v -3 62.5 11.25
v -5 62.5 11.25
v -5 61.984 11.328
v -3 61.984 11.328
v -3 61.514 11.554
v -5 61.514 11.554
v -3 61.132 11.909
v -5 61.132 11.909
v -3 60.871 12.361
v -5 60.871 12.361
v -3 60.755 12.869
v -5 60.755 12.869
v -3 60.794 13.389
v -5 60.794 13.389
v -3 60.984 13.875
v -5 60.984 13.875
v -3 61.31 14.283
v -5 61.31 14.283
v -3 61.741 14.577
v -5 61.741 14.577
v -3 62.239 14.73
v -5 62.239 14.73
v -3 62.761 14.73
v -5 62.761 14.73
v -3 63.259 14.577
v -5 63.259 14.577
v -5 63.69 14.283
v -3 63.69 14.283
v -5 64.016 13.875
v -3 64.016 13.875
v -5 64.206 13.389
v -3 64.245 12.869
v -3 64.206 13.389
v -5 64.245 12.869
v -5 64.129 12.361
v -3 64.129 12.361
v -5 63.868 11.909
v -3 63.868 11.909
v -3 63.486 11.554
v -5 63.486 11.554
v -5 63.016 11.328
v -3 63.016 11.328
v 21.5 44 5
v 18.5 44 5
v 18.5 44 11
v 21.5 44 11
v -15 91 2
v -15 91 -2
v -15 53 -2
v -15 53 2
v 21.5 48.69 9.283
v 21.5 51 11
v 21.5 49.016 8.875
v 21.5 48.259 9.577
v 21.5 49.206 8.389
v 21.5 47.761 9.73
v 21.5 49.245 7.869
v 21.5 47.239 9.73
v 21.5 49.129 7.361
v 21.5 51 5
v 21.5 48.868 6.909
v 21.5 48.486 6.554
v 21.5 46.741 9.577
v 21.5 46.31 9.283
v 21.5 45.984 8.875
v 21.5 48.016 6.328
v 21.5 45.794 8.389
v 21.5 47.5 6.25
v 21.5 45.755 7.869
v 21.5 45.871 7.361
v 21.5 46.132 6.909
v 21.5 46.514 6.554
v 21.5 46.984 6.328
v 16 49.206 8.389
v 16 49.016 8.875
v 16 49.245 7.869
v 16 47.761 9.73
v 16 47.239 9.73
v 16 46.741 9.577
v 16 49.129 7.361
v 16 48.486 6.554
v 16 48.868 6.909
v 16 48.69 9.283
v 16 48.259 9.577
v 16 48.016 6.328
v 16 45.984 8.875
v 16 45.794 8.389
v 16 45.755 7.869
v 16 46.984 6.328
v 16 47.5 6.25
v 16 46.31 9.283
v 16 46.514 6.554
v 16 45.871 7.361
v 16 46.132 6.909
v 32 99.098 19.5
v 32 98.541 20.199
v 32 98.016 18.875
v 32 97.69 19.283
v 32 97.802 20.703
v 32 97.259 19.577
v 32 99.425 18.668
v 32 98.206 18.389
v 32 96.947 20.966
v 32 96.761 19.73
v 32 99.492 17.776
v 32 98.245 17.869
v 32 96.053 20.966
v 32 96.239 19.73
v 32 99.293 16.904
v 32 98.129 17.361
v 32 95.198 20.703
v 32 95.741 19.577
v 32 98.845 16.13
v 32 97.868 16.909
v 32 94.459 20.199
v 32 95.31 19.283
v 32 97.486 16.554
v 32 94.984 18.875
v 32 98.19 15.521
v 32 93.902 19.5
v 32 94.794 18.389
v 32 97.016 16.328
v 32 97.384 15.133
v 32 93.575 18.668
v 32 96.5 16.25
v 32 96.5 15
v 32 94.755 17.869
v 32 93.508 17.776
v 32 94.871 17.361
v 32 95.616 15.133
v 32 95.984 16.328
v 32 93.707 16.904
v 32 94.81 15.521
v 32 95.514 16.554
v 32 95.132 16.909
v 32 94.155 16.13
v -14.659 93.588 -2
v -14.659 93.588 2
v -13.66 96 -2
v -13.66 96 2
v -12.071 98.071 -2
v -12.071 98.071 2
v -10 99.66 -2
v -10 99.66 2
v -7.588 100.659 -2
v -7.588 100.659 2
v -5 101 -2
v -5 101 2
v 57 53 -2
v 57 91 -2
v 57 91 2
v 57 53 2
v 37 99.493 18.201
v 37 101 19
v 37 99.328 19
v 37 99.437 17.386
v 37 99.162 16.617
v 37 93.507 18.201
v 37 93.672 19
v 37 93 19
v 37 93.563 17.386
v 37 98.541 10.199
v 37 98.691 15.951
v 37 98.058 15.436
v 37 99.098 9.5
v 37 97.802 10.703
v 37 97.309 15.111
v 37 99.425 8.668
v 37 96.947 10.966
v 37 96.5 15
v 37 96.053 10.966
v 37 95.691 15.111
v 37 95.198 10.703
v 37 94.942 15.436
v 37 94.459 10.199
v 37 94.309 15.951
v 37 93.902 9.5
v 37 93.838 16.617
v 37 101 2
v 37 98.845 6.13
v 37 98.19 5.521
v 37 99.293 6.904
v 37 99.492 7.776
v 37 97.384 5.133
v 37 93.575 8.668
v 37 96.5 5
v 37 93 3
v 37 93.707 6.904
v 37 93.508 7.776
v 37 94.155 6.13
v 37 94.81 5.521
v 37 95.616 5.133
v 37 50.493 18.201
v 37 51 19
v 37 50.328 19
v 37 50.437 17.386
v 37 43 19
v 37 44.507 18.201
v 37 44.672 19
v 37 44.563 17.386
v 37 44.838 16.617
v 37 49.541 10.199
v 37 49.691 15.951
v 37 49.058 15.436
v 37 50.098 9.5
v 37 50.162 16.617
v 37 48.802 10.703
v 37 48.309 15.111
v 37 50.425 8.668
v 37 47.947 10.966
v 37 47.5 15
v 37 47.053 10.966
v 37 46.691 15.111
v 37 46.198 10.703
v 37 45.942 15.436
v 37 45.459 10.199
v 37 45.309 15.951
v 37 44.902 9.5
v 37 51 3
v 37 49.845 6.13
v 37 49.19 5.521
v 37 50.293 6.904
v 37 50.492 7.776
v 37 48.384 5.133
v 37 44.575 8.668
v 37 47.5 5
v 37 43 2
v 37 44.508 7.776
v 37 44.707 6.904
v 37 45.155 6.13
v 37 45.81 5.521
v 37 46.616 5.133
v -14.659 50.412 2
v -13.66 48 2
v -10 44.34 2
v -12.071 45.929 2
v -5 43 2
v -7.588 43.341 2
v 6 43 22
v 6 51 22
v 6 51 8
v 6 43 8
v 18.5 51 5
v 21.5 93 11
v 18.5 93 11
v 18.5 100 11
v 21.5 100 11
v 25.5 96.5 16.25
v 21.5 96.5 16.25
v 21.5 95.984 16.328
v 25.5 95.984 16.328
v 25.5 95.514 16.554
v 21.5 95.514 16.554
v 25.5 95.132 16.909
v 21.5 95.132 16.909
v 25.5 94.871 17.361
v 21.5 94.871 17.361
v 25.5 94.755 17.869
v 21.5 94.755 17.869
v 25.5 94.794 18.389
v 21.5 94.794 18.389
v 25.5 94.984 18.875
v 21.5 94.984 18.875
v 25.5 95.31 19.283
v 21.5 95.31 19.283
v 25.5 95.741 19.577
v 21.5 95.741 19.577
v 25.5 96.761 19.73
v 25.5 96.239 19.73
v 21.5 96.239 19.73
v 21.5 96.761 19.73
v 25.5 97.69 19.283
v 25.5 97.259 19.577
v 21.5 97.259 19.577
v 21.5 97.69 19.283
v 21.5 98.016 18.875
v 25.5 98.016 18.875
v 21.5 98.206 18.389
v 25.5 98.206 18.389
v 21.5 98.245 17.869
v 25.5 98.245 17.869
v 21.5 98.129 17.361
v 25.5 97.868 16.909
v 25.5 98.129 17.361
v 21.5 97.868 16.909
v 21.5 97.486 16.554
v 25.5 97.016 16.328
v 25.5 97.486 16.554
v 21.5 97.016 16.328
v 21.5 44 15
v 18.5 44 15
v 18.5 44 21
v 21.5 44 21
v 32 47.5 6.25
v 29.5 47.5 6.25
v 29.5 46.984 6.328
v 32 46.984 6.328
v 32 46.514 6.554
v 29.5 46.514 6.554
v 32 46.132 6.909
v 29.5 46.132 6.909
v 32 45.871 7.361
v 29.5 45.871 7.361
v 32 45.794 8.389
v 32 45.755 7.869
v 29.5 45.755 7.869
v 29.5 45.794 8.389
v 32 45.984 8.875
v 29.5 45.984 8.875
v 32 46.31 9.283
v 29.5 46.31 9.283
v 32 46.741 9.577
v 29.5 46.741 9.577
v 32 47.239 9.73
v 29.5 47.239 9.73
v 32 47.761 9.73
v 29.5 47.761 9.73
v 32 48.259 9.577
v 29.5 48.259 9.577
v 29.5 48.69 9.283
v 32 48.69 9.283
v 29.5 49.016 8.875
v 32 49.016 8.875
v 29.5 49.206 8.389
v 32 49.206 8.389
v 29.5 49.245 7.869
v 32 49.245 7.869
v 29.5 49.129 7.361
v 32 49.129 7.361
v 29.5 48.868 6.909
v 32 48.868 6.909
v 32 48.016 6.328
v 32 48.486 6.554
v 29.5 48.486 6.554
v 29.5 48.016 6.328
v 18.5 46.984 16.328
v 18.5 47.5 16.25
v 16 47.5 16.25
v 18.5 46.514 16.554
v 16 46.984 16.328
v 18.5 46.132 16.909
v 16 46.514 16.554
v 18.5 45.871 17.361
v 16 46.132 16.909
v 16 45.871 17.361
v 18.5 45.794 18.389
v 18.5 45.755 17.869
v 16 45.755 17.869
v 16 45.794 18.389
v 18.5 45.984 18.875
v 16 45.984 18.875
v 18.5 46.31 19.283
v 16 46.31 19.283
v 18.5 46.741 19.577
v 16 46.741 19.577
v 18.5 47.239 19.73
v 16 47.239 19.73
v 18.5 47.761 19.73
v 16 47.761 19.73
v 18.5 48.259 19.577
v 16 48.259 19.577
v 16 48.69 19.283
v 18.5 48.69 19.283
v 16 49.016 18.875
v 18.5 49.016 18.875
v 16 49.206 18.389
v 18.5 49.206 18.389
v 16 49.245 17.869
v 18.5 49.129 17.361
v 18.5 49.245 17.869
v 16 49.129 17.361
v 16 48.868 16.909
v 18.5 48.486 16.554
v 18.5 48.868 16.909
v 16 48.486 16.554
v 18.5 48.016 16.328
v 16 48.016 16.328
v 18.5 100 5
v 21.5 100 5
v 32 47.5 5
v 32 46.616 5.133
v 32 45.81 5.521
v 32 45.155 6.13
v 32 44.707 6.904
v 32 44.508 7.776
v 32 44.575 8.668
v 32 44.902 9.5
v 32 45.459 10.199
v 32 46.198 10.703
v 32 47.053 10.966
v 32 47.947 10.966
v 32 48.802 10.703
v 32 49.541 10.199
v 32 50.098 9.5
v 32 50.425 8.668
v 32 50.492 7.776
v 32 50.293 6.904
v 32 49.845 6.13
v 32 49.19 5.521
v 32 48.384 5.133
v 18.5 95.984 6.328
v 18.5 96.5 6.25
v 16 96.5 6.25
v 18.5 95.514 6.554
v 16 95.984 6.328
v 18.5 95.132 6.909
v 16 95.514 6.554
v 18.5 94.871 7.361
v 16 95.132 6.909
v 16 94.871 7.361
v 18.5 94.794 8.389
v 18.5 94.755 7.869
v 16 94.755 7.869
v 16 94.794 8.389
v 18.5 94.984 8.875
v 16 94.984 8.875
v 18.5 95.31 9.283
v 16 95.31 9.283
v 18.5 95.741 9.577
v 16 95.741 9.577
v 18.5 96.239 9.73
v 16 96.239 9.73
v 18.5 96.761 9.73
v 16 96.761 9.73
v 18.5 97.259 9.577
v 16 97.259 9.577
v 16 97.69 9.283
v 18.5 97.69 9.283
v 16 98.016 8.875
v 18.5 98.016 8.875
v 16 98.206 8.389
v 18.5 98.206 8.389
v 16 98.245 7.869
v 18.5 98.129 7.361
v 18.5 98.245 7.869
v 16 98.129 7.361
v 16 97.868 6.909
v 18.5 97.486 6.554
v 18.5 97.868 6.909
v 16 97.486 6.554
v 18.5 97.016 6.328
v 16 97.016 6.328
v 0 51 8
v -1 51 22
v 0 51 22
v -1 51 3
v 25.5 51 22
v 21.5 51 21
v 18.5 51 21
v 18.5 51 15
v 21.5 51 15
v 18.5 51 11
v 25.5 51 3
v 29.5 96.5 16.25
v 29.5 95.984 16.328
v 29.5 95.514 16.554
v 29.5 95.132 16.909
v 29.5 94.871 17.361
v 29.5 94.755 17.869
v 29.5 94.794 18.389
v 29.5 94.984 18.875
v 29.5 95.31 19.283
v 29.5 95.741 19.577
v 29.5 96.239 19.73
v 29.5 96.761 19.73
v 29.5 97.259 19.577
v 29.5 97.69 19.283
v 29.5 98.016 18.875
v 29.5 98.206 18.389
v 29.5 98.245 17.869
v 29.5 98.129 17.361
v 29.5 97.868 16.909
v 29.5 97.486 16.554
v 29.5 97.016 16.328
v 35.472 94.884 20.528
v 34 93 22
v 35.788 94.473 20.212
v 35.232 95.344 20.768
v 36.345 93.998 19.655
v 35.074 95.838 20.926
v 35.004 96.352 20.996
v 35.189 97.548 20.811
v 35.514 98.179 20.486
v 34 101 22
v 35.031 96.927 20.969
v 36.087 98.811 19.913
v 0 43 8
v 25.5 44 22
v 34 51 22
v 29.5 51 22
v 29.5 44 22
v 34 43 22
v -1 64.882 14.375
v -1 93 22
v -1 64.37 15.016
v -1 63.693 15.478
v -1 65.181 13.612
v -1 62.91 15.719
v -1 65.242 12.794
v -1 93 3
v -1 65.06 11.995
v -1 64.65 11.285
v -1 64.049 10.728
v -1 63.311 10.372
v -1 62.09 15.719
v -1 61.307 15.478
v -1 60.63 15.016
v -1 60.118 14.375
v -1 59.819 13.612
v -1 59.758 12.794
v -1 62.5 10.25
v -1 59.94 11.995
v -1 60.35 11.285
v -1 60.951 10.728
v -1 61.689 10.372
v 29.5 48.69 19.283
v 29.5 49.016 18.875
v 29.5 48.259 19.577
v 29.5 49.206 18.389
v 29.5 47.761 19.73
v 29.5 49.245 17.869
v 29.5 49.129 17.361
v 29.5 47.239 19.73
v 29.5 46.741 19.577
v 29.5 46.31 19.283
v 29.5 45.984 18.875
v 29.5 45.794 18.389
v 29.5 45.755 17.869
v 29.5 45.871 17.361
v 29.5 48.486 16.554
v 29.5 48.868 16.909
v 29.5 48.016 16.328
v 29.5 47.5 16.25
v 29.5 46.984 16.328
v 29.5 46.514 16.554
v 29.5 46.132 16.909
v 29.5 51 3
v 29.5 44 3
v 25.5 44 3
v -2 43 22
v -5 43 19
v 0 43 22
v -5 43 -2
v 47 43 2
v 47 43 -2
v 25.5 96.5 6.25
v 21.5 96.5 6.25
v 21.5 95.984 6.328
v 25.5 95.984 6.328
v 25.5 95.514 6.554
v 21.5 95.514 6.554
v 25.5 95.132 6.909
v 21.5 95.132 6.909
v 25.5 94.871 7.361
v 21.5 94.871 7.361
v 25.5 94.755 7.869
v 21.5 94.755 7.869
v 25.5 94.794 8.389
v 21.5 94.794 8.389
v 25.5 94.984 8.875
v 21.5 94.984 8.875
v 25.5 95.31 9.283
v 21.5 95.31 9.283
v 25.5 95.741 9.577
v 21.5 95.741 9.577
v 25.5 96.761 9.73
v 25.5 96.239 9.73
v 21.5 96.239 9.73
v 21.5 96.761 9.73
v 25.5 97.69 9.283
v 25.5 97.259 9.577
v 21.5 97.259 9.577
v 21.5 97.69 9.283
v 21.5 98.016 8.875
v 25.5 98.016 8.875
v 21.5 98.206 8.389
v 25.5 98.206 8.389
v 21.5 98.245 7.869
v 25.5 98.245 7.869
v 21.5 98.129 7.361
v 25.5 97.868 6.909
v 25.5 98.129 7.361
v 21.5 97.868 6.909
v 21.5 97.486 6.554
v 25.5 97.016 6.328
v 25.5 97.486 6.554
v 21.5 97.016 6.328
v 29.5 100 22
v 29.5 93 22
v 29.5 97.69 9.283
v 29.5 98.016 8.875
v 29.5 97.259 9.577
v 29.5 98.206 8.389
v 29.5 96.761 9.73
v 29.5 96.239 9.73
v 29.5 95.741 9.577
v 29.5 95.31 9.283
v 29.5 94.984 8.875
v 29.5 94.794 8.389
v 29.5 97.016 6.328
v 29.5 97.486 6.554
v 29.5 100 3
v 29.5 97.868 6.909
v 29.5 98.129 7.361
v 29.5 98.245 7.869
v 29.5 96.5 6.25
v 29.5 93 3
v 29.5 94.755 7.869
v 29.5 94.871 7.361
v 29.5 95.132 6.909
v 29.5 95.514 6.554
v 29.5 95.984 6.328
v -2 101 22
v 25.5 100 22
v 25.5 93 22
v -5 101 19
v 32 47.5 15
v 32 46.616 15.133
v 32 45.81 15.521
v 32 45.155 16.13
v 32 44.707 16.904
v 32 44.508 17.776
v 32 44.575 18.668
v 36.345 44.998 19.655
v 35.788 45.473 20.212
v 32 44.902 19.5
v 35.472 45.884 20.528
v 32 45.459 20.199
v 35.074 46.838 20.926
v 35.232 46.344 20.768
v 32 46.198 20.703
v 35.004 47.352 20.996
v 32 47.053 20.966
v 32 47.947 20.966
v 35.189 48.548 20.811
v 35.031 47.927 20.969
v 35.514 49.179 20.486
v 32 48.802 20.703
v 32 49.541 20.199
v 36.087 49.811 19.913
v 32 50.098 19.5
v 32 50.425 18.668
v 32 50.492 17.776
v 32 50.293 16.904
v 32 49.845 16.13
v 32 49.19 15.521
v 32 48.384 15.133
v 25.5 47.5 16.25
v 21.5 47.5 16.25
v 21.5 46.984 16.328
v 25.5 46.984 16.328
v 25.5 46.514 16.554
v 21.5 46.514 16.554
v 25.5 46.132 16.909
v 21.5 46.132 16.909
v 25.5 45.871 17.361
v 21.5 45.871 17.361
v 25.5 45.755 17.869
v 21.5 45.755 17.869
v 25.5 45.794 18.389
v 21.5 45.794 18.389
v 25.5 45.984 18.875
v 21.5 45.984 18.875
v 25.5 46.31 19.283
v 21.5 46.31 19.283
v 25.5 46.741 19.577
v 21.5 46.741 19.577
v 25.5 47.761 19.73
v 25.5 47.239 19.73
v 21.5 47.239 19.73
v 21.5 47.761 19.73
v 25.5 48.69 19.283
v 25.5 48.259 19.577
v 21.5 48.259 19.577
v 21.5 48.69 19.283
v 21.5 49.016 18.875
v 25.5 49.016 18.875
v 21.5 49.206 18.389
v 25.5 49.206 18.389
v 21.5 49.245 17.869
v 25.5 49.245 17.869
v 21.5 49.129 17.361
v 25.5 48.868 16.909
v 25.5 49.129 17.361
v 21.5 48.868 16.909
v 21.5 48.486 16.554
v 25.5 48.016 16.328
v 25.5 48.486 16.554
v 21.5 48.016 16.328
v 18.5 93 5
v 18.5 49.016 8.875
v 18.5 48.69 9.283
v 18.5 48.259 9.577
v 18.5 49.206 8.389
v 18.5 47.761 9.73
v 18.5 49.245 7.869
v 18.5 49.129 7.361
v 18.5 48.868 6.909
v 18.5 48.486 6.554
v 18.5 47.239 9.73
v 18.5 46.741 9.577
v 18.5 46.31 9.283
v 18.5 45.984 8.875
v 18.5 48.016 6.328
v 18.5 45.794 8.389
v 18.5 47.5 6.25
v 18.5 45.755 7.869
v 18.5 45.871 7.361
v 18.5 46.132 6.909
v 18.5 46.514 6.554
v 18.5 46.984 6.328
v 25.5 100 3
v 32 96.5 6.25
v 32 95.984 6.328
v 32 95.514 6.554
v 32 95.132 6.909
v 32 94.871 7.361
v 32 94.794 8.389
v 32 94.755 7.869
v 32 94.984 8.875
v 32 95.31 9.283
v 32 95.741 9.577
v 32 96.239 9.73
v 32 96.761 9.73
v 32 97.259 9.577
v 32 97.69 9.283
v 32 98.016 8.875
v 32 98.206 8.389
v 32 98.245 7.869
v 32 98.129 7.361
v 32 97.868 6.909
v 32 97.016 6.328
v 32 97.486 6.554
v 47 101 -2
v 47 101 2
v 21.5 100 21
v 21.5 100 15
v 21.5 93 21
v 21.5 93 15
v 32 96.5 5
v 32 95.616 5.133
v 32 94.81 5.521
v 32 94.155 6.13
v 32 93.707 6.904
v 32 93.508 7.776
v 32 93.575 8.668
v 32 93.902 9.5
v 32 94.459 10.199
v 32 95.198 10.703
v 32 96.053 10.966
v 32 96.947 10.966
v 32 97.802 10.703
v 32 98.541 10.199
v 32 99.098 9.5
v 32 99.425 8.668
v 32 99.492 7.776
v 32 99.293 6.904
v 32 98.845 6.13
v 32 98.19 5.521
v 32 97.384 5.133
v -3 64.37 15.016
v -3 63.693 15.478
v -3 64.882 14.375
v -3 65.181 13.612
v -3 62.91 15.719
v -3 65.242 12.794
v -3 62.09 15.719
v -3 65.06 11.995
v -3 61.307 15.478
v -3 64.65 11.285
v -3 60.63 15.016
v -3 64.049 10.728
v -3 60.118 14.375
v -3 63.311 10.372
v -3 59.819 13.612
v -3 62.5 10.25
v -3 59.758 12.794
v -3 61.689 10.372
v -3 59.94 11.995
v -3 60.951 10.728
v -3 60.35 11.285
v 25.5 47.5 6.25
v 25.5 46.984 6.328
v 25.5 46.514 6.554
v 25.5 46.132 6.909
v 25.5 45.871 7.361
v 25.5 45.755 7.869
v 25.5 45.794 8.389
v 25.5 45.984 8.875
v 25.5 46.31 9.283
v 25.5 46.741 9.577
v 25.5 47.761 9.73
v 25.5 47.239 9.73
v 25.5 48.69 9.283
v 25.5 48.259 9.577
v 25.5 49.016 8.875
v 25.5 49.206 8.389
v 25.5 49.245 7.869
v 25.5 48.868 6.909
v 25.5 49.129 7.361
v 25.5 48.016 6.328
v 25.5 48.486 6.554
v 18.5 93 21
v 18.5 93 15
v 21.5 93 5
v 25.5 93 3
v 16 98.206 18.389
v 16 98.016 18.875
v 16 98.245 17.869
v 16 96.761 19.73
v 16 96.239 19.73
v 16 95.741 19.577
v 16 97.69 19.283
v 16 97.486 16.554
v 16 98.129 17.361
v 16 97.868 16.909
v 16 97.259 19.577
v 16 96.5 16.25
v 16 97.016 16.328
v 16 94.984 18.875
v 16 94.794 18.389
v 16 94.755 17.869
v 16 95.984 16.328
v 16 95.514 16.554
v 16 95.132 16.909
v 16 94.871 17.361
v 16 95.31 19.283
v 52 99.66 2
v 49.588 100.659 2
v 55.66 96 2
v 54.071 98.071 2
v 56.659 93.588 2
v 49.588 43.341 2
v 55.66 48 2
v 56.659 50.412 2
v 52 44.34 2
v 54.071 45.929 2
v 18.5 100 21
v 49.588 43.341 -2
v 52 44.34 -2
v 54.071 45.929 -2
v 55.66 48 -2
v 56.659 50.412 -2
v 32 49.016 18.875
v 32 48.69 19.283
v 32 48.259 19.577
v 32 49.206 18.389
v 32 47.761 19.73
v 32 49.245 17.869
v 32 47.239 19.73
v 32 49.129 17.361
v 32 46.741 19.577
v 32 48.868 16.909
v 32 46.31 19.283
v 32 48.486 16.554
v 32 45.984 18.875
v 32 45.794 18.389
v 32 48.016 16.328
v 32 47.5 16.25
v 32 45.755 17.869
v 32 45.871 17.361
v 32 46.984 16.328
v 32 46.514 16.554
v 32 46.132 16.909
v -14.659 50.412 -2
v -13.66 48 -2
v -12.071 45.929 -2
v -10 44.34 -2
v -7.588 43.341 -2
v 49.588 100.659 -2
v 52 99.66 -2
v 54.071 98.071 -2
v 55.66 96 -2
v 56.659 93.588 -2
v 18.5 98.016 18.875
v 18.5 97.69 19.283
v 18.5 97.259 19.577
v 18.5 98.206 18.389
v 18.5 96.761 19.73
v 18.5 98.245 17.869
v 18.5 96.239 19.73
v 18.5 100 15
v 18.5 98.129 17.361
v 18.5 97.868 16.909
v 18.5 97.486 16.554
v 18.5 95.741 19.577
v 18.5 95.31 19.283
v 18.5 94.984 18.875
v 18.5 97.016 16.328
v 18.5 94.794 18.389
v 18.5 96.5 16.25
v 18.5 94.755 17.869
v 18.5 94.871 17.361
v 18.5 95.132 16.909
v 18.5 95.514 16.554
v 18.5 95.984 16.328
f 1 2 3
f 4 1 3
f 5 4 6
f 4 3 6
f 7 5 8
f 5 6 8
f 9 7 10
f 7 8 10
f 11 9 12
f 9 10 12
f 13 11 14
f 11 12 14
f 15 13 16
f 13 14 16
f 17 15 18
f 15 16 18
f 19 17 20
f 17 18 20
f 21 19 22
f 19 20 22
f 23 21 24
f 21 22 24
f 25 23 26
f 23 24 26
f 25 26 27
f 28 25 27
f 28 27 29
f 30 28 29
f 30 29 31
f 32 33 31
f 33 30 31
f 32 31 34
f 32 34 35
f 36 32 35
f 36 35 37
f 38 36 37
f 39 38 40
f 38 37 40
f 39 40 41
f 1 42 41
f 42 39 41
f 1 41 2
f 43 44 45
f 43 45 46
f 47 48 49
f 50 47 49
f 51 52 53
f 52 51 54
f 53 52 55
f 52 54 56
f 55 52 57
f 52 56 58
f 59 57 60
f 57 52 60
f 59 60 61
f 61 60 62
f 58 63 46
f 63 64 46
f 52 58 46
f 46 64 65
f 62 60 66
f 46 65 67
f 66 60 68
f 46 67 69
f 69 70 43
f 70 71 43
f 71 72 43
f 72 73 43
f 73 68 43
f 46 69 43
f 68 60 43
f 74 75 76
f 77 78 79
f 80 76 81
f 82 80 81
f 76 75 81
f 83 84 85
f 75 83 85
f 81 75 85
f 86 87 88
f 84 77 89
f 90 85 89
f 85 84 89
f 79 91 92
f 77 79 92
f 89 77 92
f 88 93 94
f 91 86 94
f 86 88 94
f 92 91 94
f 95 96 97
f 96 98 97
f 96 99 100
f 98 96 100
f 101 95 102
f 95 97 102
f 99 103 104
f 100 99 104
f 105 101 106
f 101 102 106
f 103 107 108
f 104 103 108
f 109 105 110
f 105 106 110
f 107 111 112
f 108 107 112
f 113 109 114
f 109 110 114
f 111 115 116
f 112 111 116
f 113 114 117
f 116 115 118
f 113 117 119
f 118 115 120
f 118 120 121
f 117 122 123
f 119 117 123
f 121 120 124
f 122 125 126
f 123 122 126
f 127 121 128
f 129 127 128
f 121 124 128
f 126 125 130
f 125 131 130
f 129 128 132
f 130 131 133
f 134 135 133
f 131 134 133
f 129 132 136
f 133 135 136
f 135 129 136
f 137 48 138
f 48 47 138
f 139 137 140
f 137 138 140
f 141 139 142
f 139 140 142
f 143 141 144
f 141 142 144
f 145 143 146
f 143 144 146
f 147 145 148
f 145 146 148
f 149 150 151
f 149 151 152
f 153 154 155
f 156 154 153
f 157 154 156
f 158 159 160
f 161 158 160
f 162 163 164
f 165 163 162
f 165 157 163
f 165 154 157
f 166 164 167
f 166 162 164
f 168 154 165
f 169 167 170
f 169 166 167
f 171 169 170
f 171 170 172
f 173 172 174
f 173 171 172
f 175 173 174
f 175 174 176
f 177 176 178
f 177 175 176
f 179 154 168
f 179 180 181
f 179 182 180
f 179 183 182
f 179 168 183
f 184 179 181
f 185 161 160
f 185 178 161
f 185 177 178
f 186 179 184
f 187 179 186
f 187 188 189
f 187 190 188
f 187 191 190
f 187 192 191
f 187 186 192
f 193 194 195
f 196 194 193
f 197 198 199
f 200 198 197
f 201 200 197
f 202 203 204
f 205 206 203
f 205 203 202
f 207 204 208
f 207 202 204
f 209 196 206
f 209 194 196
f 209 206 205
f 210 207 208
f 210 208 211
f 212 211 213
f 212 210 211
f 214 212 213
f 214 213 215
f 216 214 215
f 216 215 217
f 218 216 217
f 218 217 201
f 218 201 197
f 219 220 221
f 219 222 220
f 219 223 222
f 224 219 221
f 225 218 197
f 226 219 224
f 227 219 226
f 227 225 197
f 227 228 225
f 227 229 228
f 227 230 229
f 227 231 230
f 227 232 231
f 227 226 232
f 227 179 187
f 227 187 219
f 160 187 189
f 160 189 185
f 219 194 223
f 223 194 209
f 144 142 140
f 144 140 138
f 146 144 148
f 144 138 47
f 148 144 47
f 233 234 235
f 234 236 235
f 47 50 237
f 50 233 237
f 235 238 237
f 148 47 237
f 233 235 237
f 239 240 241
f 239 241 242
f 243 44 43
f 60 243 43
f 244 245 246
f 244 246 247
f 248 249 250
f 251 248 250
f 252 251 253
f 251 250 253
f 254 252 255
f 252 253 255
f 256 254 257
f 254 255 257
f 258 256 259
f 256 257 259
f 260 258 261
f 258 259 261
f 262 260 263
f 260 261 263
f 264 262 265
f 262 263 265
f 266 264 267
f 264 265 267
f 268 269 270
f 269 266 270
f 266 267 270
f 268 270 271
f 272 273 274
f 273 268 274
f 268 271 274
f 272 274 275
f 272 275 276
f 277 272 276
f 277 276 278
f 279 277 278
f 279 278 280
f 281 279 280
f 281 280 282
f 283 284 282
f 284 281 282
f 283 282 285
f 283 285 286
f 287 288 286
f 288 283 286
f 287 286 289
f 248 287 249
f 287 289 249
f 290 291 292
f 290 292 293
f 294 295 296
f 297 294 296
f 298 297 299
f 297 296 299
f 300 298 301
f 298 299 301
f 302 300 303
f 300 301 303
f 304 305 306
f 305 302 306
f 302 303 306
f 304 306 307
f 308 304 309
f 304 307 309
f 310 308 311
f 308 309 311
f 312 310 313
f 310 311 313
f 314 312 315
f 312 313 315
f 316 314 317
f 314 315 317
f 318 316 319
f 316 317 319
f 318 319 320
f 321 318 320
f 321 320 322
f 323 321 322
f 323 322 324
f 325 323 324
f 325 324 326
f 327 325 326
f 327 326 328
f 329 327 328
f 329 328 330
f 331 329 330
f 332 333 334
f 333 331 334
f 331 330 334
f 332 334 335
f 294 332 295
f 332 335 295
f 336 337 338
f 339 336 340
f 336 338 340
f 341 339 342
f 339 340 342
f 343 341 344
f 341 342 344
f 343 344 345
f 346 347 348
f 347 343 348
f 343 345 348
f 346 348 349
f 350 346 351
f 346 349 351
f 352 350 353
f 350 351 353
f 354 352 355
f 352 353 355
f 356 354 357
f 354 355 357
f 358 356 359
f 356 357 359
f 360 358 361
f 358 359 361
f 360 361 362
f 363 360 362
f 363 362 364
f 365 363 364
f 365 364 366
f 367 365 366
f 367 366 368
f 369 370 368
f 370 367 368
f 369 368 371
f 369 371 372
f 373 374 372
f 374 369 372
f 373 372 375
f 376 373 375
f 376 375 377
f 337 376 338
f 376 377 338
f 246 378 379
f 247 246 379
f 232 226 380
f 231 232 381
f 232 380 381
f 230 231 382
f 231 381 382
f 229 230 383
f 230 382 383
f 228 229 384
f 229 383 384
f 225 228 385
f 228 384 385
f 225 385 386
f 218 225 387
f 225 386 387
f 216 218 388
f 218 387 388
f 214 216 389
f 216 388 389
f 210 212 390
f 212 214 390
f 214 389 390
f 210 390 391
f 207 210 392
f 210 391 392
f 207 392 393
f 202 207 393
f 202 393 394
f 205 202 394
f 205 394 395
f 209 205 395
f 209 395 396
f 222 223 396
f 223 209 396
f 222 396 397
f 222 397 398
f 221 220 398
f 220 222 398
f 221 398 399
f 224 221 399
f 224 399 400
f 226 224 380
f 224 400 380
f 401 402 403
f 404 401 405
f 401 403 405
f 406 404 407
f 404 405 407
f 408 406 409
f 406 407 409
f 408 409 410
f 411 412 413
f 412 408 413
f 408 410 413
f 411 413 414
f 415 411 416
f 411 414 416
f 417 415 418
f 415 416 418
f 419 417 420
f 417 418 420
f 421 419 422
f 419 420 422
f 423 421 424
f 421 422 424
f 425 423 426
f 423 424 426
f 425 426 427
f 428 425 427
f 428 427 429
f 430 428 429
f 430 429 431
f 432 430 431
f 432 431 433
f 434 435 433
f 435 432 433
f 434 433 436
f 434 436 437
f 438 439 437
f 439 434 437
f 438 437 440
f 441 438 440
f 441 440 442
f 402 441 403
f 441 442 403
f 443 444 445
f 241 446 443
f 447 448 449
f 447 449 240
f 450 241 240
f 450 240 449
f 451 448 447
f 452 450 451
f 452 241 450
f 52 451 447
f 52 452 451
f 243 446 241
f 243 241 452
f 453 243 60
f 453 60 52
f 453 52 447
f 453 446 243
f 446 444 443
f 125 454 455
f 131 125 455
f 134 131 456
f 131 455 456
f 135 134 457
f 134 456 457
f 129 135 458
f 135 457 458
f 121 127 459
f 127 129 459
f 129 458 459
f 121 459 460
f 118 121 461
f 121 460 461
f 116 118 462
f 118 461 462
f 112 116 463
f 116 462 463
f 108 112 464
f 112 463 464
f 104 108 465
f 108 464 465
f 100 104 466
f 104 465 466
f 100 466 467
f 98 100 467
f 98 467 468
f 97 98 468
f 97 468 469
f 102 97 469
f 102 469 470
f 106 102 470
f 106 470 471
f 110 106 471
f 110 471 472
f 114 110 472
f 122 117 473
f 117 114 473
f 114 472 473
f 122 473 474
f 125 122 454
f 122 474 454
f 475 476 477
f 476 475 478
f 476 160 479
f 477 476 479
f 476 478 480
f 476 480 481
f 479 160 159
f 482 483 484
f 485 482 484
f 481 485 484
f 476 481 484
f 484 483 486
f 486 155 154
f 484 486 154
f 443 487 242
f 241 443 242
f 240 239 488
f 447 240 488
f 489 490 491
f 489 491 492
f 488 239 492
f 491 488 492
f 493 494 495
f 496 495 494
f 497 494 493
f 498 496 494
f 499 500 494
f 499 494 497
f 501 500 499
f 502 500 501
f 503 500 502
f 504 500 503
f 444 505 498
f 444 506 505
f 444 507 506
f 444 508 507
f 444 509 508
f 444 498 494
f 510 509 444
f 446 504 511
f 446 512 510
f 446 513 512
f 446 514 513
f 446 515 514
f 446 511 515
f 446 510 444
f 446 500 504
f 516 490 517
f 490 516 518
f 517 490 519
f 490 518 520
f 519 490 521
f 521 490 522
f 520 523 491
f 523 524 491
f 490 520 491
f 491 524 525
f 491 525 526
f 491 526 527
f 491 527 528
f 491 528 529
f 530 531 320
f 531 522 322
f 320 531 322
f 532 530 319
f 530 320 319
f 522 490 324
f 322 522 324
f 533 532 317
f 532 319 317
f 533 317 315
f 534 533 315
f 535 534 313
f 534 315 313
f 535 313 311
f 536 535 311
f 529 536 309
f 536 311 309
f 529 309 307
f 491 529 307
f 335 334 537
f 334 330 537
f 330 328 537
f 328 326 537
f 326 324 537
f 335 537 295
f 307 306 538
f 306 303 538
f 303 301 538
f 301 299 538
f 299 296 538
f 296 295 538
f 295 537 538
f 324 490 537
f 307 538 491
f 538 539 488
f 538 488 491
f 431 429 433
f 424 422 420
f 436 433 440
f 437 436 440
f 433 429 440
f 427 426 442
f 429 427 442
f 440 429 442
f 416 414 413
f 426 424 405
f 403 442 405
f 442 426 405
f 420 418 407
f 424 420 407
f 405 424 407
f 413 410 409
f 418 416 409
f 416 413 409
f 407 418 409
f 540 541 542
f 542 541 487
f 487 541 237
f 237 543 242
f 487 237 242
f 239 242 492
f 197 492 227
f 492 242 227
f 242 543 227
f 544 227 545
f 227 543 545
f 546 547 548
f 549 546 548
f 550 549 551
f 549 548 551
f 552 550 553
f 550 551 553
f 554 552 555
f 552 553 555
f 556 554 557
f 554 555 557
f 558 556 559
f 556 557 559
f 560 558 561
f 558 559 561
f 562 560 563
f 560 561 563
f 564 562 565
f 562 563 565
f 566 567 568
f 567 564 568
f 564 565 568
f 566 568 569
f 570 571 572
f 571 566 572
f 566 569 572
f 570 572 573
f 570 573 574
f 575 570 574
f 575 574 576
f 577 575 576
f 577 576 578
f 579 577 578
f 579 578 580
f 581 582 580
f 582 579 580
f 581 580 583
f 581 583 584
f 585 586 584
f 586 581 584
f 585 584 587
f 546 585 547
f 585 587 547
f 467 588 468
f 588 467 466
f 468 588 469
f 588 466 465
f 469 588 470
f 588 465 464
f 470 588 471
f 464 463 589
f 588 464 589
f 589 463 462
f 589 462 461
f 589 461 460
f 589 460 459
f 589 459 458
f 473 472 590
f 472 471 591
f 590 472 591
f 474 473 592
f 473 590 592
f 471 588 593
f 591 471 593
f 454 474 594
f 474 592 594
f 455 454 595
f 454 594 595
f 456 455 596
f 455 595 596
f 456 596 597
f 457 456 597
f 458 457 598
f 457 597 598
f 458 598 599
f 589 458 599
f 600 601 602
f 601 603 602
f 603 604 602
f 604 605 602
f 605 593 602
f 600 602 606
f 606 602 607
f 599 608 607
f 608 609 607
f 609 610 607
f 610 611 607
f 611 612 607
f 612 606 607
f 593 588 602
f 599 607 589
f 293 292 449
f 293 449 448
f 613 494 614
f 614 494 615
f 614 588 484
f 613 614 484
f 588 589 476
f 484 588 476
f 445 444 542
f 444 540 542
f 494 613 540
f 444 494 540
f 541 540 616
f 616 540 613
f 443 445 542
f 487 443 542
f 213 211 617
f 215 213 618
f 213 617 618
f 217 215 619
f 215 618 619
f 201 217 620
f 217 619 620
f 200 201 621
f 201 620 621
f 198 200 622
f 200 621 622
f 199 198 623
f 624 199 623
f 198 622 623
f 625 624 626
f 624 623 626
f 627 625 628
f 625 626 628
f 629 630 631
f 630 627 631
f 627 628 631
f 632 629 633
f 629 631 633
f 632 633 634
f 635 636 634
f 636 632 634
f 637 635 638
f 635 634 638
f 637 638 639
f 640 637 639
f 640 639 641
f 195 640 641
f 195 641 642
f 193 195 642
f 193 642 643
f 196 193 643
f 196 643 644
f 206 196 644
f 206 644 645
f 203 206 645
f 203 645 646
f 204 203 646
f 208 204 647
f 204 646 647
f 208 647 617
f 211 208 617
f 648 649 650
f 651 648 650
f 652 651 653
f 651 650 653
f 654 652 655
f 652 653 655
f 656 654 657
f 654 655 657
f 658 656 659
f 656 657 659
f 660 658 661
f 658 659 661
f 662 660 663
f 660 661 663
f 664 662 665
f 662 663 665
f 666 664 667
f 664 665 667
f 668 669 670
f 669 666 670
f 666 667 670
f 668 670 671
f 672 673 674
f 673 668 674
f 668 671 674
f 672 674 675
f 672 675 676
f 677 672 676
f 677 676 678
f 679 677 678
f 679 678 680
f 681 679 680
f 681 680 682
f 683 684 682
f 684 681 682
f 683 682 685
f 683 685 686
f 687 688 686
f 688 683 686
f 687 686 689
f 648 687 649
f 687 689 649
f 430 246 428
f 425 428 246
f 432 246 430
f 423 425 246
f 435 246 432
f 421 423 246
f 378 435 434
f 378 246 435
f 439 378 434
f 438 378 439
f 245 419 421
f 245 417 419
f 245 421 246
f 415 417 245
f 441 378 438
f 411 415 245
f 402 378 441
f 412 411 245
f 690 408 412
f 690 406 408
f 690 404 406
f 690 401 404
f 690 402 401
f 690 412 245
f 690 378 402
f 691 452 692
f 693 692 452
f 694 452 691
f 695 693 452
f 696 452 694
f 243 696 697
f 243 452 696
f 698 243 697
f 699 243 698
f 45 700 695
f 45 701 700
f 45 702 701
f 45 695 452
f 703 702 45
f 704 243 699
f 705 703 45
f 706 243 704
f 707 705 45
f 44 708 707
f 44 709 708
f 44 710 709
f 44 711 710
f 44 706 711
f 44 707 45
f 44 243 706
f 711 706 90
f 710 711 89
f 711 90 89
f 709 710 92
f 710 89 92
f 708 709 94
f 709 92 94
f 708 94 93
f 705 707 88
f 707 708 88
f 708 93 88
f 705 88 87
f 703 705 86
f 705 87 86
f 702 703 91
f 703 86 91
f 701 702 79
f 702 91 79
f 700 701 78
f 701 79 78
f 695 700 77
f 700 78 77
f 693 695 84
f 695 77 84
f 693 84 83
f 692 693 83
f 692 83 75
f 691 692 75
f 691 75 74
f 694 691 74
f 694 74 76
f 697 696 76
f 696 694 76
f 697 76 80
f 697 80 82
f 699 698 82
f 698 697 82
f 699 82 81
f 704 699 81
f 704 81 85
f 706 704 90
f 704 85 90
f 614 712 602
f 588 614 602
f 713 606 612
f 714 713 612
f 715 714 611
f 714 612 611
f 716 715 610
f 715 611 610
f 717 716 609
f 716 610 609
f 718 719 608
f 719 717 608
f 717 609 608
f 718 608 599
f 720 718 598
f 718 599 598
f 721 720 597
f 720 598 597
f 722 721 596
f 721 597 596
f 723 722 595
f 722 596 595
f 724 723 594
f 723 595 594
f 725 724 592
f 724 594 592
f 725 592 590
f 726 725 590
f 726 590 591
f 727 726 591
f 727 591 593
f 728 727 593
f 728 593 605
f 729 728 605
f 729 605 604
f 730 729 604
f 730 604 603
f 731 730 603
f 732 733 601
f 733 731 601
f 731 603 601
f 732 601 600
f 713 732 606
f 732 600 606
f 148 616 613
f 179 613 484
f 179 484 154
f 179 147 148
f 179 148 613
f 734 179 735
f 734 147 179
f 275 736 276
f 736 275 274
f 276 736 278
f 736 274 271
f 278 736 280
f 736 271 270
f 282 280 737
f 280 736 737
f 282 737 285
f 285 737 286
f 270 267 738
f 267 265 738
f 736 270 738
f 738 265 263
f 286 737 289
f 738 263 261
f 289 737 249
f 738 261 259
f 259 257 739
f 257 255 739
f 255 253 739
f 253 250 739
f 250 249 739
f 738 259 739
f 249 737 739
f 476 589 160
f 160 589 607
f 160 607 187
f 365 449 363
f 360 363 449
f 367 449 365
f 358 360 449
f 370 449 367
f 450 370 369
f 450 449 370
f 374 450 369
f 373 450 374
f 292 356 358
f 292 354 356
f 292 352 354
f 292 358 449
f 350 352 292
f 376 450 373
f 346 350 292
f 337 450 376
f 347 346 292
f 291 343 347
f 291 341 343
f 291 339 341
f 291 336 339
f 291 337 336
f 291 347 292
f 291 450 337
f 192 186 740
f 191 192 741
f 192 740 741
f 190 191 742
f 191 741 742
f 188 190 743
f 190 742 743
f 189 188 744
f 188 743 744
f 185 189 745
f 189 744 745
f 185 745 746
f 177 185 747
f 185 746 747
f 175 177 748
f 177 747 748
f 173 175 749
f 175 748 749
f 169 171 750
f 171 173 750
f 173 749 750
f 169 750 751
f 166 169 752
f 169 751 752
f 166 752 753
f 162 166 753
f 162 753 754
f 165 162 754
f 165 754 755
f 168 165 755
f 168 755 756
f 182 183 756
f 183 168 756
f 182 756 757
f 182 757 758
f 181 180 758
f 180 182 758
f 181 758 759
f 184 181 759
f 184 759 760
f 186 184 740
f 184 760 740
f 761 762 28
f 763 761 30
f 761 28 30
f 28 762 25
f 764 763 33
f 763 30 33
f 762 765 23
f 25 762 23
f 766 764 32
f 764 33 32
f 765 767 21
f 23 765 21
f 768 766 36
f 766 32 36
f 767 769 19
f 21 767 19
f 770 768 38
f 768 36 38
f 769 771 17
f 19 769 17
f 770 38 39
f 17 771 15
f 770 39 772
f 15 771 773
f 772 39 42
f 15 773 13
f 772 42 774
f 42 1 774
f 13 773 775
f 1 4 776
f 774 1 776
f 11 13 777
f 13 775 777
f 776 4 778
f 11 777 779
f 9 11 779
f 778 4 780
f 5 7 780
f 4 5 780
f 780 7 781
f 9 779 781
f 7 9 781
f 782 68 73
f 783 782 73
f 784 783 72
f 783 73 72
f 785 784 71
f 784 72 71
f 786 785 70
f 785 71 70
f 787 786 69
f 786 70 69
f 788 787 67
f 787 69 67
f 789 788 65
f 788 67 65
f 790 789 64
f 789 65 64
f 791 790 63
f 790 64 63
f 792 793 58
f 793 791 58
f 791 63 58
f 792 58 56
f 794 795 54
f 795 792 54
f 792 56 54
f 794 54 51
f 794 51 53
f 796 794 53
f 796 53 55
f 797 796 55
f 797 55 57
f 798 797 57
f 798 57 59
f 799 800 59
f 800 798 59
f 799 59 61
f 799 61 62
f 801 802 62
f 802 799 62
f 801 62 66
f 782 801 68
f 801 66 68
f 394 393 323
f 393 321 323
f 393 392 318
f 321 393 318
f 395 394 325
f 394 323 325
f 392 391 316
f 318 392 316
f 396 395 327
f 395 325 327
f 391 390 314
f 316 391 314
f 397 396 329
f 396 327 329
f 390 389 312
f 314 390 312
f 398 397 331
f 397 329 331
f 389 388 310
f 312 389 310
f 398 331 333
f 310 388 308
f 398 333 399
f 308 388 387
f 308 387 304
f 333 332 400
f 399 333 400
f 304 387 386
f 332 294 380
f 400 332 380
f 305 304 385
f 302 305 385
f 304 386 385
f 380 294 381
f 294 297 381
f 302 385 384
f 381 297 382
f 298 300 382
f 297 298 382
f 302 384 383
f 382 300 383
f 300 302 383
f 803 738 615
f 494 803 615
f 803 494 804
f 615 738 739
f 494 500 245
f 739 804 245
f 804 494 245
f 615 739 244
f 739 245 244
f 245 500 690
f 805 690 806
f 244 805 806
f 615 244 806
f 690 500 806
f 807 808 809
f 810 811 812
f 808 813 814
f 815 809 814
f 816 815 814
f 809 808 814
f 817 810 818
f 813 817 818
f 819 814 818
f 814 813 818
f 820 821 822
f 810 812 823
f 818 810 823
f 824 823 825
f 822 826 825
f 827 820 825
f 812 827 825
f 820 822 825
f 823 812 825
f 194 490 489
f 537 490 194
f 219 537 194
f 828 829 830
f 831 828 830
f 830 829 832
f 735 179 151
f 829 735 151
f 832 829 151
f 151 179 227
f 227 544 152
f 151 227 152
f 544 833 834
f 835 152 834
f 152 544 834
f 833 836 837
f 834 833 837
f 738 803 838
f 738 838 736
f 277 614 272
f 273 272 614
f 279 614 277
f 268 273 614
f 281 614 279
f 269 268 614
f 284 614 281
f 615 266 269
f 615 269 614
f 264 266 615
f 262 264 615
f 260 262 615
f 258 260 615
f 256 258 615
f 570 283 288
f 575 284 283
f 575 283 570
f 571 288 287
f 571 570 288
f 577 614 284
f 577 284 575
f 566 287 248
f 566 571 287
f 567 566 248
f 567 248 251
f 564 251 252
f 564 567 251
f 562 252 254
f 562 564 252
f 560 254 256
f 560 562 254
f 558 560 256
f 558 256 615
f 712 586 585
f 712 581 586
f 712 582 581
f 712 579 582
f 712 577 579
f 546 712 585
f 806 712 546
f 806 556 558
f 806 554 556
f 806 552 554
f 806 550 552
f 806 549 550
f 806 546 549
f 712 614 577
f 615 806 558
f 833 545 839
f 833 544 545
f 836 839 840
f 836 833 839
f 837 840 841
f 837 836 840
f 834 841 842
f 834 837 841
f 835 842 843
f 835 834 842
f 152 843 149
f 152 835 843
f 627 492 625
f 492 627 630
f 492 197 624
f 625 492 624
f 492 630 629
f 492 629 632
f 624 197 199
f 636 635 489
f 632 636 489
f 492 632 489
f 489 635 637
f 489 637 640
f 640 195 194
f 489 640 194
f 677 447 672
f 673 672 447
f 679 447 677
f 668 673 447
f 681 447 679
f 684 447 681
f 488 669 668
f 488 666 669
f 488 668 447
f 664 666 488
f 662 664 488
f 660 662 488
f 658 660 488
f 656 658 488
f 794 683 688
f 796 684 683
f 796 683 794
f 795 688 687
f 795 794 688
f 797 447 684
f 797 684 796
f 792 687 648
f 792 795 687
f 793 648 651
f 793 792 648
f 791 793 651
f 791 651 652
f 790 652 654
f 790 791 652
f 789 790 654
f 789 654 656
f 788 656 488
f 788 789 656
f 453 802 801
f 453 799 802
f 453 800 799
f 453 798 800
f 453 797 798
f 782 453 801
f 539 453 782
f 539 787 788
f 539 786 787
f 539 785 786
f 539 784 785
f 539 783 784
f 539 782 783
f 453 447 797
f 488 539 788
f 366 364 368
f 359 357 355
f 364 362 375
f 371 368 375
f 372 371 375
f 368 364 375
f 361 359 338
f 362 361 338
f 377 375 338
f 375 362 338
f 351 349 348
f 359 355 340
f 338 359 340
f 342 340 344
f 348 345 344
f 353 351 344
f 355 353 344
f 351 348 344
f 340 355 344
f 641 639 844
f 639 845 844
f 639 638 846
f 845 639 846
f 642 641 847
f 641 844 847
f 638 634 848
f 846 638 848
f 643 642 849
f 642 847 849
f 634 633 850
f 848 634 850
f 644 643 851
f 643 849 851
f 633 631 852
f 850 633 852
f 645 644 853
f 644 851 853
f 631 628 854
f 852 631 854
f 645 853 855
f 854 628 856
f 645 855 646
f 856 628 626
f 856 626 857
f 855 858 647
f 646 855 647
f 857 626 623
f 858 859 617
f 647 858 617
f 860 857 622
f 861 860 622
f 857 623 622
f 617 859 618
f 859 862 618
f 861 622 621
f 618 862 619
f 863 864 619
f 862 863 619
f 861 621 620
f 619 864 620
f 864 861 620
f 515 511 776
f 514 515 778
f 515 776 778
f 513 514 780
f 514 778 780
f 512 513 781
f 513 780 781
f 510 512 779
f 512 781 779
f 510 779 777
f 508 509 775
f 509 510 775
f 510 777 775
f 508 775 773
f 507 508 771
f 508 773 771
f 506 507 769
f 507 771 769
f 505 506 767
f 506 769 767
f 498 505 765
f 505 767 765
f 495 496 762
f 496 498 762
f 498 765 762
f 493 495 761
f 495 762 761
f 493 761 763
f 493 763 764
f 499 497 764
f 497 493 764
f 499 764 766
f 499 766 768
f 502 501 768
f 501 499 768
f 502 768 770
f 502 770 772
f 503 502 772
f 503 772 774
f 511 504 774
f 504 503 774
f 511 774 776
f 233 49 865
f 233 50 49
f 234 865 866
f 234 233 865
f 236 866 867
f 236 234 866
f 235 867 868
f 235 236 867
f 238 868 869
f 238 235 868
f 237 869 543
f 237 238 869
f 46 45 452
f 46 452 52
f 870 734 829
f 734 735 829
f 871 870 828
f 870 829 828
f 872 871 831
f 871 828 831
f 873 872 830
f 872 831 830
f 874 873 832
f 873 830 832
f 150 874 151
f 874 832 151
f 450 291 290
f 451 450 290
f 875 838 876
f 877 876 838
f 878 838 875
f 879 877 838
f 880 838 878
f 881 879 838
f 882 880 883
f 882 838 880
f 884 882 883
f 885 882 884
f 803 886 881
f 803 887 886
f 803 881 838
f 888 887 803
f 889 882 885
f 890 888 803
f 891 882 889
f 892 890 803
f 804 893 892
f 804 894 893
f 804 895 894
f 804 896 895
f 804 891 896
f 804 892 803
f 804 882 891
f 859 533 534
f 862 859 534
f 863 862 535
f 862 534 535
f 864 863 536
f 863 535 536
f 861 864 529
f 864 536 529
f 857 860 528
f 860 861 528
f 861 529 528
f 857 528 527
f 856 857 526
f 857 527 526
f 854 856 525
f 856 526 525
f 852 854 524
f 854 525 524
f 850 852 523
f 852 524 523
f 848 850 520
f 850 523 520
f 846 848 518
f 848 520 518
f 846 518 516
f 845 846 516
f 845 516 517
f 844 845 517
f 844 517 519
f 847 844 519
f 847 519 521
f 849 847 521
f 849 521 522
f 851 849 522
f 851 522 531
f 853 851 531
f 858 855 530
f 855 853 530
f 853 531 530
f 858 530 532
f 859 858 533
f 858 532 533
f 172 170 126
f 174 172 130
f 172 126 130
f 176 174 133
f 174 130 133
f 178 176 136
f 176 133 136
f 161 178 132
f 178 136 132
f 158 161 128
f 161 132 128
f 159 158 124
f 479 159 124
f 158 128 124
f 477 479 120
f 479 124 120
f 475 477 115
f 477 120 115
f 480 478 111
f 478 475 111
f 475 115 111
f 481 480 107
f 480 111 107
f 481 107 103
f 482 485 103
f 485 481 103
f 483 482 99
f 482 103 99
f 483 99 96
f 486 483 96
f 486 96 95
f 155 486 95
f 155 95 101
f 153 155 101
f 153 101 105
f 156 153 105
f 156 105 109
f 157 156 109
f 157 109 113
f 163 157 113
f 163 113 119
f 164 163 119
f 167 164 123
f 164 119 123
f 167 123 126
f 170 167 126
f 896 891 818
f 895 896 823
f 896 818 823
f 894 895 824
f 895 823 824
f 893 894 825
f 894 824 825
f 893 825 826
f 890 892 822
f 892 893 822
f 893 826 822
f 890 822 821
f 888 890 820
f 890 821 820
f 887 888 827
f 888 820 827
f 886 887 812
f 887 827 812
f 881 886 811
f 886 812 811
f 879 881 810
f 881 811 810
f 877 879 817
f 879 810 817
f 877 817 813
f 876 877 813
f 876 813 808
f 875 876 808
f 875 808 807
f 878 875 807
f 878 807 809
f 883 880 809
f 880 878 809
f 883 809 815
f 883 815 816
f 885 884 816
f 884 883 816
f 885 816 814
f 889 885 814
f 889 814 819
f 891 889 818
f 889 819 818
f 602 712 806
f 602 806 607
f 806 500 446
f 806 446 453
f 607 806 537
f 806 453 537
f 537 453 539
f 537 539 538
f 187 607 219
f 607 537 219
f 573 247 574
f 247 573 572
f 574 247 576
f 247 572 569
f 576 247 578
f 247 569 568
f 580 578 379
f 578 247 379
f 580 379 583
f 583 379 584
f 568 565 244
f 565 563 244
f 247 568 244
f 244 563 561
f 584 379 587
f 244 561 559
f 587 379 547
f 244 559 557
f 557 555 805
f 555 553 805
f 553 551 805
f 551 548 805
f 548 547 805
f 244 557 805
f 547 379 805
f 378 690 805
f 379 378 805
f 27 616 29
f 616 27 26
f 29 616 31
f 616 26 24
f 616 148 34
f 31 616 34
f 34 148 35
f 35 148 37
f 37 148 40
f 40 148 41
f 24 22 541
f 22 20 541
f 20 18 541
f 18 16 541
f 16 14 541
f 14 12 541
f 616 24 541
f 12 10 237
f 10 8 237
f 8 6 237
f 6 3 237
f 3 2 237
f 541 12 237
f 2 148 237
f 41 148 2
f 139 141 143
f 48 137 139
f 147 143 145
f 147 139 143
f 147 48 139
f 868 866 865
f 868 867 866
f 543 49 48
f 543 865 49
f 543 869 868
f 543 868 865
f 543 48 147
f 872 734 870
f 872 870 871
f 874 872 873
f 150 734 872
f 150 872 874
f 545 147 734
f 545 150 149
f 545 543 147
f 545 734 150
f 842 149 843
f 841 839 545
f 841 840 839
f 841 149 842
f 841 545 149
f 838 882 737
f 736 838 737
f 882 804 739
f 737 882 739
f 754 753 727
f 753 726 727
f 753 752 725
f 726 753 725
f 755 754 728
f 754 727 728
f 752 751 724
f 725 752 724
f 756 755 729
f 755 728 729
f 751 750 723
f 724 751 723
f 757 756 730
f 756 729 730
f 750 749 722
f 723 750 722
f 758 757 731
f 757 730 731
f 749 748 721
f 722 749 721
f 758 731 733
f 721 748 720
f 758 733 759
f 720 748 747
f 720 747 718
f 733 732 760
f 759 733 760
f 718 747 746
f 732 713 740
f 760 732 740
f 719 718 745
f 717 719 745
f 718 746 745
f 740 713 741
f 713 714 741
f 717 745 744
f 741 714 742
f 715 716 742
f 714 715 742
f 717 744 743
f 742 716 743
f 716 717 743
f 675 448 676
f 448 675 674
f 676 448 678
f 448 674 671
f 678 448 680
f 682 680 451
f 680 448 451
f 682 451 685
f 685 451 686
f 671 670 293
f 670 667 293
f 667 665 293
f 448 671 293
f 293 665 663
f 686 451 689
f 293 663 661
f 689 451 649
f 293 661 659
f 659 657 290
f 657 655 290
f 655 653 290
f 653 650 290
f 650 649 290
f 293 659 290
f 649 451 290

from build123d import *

# Parameters (mm, degrees)
BOX024_W                = 6
BOX024_H                = 36
BOX024_DEPTH            = 23
CYLINDER011_R           = 2.75
CYLINDER011_DEPTH       = 74.5
CYLINDER011_PITCH_ANGLE = 90
CYLINDER008_R           = 1.75
CYLINDER008_DEPTH       = 21.5
CYLINDER008_PITCH_ANGLE = 90
CYLINDER009_R           = 3
CYLINDER009_DEPTH       = 21.5
CYLINDER009_PITCH_ANGLE = 90
BOX007_W                = 3
BOX007_H                = 56
BOX007_DEPTH            = 6
BOX008_W                = 3
BOX008_H                = 56
BOX008_DEPTH            = 6
BOX006_W                = 4
BOX006_H                = 56
BOX006_DEPTH            = 21
CYLINDER003_R           = 1.75
CYLINDER003_DEPTH       = 74.5
CYLINDER003_PITCH_ANGLE = 90
BOX003_W                = 28
BOX003_H                = 88
BOX003_DEPTH            = 38
BOX002_W                = 28
BOX002_H                = 88
BOX002_DEPTH            = 38
BOX001_W                = 47
BOX001_H                = 42
BOX001_DEPTH            = 25
BOX_W                   = 72
BOX_H                   = 58
BOX_DEPTH               = 24
FILLET_R                = 10
CHAMFER_SIZE            = 3


with BuildPart() as cube024:
    # Box024 → Box024 (new body)
    with BuildSketch(Plane(origin=(0, 19, 7), x_dir=(1, 0, 0), z_dir=(0, 0, 1))):
        with Locations((3, 18)):
            Rectangle(BOX024_W, BOX024_H)
    extrude(amount=BOX024_DEPTH)


with BuildPart() as joint_d013:
    # Cylinder011 → Cylinder011 (new body)
    with BuildSketch(Plane.XY):
        Circle(CYLINDER011_R)
    extrude(amount=CYLINDER011_DEPTH)


with BuildPart() as joint_d013_1:
    # Cylinder011 pitch: moved
    add(joint_d013.part.rotate(Axis((0, 0, 0), (0, 1, 0)), CYLINDER011_PITCH_ANGLE))


with BuildPart() as joint_d013_2:
    # Cylinder011 placement: moved
    add(joint_d013_1.part.moved(Location((-3, 9.5, 12))))


with BuildPart() as joint_d010:
    # Cylinder008 → Cylinder008 (new body)
    with BuildSketch(Plane.XY):
        Circle(CYLINDER008_R)
    extrude(amount=CYLINDER008_DEPTH)


with BuildPart() as joint_d010_1:
    # Cylinder008 pitch: moved
    add(joint_d010.part.rotate(Axis((0, 0, 0), (0, 1, 0)), CYLINDER008_PITCH_ANGLE))


with BuildPart() as joint_d010_2:
    # Cylinder008 placement: moved
    add(joint_d010_1.part.moved(Location((16, -24.5, 7))))


with BuildPart() as joint_d011:
    # Cylinder009 → Cylinder009 (new body)
    with BuildSketch(Plane.XY):
        Circle(CYLINDER009_R)
    extrude(amount=CYLINDER009_DEPTH)


with BuildPart() as joint_d011_1:
    # Cylinder009 pitch: moved
    add(joint_d011.part.rotate(Axis((0, 0, 0), (0, 1, 0)), CYLINDER009_PITCH_ANGLE))


with BuildPart() as joint_d011_2:
    # Cylinder009 placement: moved
    add(joint_d011_1.part.moved(Location((32, -24.5, 7))))


with BuildPart() as fusion001:
    # Fusion001 base: copy of Joint-D011
    add(joint_d011_2.part)

    # Fusion001: union Joint-D010
    add(joint_d010_2.part)


with BuildPart() as fusion002:
    # Fusion002 base: copy of Joint-D011
    add(joint_d011_2.part)

    # Fusion002: union Joint-D010
    add(joint_d010_2.part)


with BuildPart() as fusion002_1:
    # Fusion002 placement: moved
    add(fusion002.part.moved(Location((0, 0, 10))))


with BuildPart() as fusion003:
    # Fusion003 base: copy of Joint-D011
    add(joint_d011_2.part)

    # Fusion003: union Joint-D010
    add(joint_d010_2.part)


with BuildPart() as fusion003_1:
    # Fusion003 placement: moved
    add(fusion003.part.moved(Location((0, 49, 0))))


with BuildPart() as fusion004:
    # Fusion004 base: copy of Joint-D011
    add(joint_d011_2.part)

    # Fusion004: union Joint-D010
    add(joint_d010_2.part)


with BuildPart() as fusion004_1:
    # Fusion004 placement: moved
    add(fusion004.part.moved(Location((0, 49, 10))))


with BuildPart() as cube007:
    # Box007 → Box007 (new body)
    with BuildSketch(Plane(origin=(18.5, -28, 4), x_dir=(1, 0, 0), z_dir=(0, 0, 1))):
        with Locations((1.5, 28)):
            Rectangle(BOX007_W, BOX007_H)
    extrude(amount=BOX007_DEPTH)


with BuildPart() as cube008:
    # Box008 → Box008 (new body)
    with BuildSketch(Plane(origin=(18.5, -28, 14), x_dir=(1, 0, 0), z_dir=(0, 0, 1))):
        with Locations((1.5, 28)):
            Rectangle(BOX008_W, BOX008_H)
    extrude(amount=BOX008_DEPTH)


with BuildPart() as cube006:
    # Box006 → Box006 (new body)
    with BuildSketch(Plane(origin=(25.5, -28, 2), x_dir=(1, 0, 0), z_dir=(0, 0, 1))):
        with Locations((2, 28)):
            Rectangle(BOX006_W, BOX006_H)
    extrude(amount=BOX006_DEPTH)


with BuildPart() as joint_d005:
    # Cylinder003 → Cylinder003 (new body)
    with BuildSketch(Plane.XY):
        Circle(CYLINDER003_R)
    extrude(amount=CYLINDER003_DEPTH)


with BuildPart() as joint_d005_1:
    # Cylinder003 pitch: moved
    add(joint_d005.part.rotate(Axis((0, 0, 0), (0, 1, 0)), CYLINDER003_PITCH_ANGLE))


with BuildPart() as joint_d005_2:
    # Cylinder003 placement: moved
    add(joint_d005_1.part.moved(Location((-22, 9.5, 12))))


with BuildPart() as cube003:
    # Box003 → Box003 (new body)
    with BuildSketch(Plane(origin=(-33, -45, 1), x_dir=(1, 0, 0), z_dir=(0, 0, 1))):
        with Locations((14, 44)):
            Rectangle(BOX003_W, BOX003_H)
    extrude(amount=BOX003_DEPTH)


with BuildPart() as cube002:
    # Box002 → Box002 (new body)
    with BuildSketch(Plane(origin=(37, -45, 1), x_dir=(1, 0, 0), z_dir=(0, 0, 1))):
        with Locations((14, 44)):
            Rectangle(BOX002_W, BOX002_H)
    extrude(amount=BOX002_DEPTH)


with BuildPart() as cube001:
    # Box001 → Box001 (new body)
    with BuildSketch(Plane(origin=(-1, -21, 2), x_dir=(1, 0, 0), z_dir=(0, 0, 1))):
        with Locations((23.5, 21)):
            Rectangle(BOX001_W, BOX001_H)
    extrude(amount=BOX001_DEPTH)


with BuildPart() as pie_d:
    # Box → Box (new body)
    with BuildSketch(Plane(origin=(-15, -29, -3), x_dir=(1, 0, 0), z_dir=(0, 0, 1))):
        with Locations((36, 29)):
            Rectangle(BOX_W, BOX_H)
    extrude(amount=BOX_DEPTH)

    # Cut: cut Cube001
    add(cube001.part, mode=Mode.SUBTRACT)

    # Cut001: cut Cube002
    add(cube002.part, mode=Mode.SUBTRACT)

    # Cut002: cut Cube003
    add(cube003.part, mode=Mode.SUBTRACT)

    # Fillet
    fillet_edges = [pie_d.edges().sort_by_distance(p)[0] for p in [
        (-15, -29, -1),
        (-15, 29, -1),
        (57, -29, -1),
        (57, 29, -1),
    ]]
    fillet(fillet_edges, radius=FILLET_R)

    # Chamfer
    chamfer_edges = [pie_d.edges().sort_by_distance(p)[0] for p in [
        (-5, 0, 21),
        (37, 25, 21),
        (37, -25, 21),
    ]]
    chamfer(chamfer_edges, length=CHAMFER_SIZE)

    # Cut008: cut Joint-D005
    add(joint_d005_2.part, mode=Mode.SUBTRACT)

    # Cut010: cut Cube006
    add(cube006.part, mode=Mode.SUBTRACT)

    # Cut011: cut Cube008
    add(cube008.part, mode=Mode.SUBTRACT)

    # Cut012: cut Cube007
    add(cube007.part, mode=Mode.SUBTRACT)

    # Cut013: cut Fusion004
    add(fusion004_1.part, mode=Mode.SUBTRACT)

    # Cut014: cut Fusion003
    add(fusion003_1.part, mode=Mode.SUBTRACT)

    # Cut015: cut Fusion002
    add(fusion002_1.part, mode=Mode.SUBTRACT)

    # Cut016: cut Fusion001
    add(fusion001.part, mode=Mode.SUBTRACT)

    # Cut017: cut Joint-D013
    add(joint_d013_2.part, mode=Mode.SUBTRACT)

    # Cut039: cut Cube024
    add(cube024.part, mode=Mode.SUBTRACT)


with BuildPart() as pie_d_1:
    # Cut039 placement: moved
    add(pie_d.part.moved(Location((0, 0, 1))))


with BuildPart() as pie_i:
    # Part__Mirroring006: instance of pie-D
    add(pie_d_1.part.mirror(Plane(origin=(0, 0, 0), x_dir=(1, 0, 0), z_dir=(0, 1, 0))))


with BuildPart() as pie_i_1:
    # Part__Mirroring006 placement: moved
    add(pie_i.part.moved(Location((0, 72, 0))))


solid = pie_i_1.part
